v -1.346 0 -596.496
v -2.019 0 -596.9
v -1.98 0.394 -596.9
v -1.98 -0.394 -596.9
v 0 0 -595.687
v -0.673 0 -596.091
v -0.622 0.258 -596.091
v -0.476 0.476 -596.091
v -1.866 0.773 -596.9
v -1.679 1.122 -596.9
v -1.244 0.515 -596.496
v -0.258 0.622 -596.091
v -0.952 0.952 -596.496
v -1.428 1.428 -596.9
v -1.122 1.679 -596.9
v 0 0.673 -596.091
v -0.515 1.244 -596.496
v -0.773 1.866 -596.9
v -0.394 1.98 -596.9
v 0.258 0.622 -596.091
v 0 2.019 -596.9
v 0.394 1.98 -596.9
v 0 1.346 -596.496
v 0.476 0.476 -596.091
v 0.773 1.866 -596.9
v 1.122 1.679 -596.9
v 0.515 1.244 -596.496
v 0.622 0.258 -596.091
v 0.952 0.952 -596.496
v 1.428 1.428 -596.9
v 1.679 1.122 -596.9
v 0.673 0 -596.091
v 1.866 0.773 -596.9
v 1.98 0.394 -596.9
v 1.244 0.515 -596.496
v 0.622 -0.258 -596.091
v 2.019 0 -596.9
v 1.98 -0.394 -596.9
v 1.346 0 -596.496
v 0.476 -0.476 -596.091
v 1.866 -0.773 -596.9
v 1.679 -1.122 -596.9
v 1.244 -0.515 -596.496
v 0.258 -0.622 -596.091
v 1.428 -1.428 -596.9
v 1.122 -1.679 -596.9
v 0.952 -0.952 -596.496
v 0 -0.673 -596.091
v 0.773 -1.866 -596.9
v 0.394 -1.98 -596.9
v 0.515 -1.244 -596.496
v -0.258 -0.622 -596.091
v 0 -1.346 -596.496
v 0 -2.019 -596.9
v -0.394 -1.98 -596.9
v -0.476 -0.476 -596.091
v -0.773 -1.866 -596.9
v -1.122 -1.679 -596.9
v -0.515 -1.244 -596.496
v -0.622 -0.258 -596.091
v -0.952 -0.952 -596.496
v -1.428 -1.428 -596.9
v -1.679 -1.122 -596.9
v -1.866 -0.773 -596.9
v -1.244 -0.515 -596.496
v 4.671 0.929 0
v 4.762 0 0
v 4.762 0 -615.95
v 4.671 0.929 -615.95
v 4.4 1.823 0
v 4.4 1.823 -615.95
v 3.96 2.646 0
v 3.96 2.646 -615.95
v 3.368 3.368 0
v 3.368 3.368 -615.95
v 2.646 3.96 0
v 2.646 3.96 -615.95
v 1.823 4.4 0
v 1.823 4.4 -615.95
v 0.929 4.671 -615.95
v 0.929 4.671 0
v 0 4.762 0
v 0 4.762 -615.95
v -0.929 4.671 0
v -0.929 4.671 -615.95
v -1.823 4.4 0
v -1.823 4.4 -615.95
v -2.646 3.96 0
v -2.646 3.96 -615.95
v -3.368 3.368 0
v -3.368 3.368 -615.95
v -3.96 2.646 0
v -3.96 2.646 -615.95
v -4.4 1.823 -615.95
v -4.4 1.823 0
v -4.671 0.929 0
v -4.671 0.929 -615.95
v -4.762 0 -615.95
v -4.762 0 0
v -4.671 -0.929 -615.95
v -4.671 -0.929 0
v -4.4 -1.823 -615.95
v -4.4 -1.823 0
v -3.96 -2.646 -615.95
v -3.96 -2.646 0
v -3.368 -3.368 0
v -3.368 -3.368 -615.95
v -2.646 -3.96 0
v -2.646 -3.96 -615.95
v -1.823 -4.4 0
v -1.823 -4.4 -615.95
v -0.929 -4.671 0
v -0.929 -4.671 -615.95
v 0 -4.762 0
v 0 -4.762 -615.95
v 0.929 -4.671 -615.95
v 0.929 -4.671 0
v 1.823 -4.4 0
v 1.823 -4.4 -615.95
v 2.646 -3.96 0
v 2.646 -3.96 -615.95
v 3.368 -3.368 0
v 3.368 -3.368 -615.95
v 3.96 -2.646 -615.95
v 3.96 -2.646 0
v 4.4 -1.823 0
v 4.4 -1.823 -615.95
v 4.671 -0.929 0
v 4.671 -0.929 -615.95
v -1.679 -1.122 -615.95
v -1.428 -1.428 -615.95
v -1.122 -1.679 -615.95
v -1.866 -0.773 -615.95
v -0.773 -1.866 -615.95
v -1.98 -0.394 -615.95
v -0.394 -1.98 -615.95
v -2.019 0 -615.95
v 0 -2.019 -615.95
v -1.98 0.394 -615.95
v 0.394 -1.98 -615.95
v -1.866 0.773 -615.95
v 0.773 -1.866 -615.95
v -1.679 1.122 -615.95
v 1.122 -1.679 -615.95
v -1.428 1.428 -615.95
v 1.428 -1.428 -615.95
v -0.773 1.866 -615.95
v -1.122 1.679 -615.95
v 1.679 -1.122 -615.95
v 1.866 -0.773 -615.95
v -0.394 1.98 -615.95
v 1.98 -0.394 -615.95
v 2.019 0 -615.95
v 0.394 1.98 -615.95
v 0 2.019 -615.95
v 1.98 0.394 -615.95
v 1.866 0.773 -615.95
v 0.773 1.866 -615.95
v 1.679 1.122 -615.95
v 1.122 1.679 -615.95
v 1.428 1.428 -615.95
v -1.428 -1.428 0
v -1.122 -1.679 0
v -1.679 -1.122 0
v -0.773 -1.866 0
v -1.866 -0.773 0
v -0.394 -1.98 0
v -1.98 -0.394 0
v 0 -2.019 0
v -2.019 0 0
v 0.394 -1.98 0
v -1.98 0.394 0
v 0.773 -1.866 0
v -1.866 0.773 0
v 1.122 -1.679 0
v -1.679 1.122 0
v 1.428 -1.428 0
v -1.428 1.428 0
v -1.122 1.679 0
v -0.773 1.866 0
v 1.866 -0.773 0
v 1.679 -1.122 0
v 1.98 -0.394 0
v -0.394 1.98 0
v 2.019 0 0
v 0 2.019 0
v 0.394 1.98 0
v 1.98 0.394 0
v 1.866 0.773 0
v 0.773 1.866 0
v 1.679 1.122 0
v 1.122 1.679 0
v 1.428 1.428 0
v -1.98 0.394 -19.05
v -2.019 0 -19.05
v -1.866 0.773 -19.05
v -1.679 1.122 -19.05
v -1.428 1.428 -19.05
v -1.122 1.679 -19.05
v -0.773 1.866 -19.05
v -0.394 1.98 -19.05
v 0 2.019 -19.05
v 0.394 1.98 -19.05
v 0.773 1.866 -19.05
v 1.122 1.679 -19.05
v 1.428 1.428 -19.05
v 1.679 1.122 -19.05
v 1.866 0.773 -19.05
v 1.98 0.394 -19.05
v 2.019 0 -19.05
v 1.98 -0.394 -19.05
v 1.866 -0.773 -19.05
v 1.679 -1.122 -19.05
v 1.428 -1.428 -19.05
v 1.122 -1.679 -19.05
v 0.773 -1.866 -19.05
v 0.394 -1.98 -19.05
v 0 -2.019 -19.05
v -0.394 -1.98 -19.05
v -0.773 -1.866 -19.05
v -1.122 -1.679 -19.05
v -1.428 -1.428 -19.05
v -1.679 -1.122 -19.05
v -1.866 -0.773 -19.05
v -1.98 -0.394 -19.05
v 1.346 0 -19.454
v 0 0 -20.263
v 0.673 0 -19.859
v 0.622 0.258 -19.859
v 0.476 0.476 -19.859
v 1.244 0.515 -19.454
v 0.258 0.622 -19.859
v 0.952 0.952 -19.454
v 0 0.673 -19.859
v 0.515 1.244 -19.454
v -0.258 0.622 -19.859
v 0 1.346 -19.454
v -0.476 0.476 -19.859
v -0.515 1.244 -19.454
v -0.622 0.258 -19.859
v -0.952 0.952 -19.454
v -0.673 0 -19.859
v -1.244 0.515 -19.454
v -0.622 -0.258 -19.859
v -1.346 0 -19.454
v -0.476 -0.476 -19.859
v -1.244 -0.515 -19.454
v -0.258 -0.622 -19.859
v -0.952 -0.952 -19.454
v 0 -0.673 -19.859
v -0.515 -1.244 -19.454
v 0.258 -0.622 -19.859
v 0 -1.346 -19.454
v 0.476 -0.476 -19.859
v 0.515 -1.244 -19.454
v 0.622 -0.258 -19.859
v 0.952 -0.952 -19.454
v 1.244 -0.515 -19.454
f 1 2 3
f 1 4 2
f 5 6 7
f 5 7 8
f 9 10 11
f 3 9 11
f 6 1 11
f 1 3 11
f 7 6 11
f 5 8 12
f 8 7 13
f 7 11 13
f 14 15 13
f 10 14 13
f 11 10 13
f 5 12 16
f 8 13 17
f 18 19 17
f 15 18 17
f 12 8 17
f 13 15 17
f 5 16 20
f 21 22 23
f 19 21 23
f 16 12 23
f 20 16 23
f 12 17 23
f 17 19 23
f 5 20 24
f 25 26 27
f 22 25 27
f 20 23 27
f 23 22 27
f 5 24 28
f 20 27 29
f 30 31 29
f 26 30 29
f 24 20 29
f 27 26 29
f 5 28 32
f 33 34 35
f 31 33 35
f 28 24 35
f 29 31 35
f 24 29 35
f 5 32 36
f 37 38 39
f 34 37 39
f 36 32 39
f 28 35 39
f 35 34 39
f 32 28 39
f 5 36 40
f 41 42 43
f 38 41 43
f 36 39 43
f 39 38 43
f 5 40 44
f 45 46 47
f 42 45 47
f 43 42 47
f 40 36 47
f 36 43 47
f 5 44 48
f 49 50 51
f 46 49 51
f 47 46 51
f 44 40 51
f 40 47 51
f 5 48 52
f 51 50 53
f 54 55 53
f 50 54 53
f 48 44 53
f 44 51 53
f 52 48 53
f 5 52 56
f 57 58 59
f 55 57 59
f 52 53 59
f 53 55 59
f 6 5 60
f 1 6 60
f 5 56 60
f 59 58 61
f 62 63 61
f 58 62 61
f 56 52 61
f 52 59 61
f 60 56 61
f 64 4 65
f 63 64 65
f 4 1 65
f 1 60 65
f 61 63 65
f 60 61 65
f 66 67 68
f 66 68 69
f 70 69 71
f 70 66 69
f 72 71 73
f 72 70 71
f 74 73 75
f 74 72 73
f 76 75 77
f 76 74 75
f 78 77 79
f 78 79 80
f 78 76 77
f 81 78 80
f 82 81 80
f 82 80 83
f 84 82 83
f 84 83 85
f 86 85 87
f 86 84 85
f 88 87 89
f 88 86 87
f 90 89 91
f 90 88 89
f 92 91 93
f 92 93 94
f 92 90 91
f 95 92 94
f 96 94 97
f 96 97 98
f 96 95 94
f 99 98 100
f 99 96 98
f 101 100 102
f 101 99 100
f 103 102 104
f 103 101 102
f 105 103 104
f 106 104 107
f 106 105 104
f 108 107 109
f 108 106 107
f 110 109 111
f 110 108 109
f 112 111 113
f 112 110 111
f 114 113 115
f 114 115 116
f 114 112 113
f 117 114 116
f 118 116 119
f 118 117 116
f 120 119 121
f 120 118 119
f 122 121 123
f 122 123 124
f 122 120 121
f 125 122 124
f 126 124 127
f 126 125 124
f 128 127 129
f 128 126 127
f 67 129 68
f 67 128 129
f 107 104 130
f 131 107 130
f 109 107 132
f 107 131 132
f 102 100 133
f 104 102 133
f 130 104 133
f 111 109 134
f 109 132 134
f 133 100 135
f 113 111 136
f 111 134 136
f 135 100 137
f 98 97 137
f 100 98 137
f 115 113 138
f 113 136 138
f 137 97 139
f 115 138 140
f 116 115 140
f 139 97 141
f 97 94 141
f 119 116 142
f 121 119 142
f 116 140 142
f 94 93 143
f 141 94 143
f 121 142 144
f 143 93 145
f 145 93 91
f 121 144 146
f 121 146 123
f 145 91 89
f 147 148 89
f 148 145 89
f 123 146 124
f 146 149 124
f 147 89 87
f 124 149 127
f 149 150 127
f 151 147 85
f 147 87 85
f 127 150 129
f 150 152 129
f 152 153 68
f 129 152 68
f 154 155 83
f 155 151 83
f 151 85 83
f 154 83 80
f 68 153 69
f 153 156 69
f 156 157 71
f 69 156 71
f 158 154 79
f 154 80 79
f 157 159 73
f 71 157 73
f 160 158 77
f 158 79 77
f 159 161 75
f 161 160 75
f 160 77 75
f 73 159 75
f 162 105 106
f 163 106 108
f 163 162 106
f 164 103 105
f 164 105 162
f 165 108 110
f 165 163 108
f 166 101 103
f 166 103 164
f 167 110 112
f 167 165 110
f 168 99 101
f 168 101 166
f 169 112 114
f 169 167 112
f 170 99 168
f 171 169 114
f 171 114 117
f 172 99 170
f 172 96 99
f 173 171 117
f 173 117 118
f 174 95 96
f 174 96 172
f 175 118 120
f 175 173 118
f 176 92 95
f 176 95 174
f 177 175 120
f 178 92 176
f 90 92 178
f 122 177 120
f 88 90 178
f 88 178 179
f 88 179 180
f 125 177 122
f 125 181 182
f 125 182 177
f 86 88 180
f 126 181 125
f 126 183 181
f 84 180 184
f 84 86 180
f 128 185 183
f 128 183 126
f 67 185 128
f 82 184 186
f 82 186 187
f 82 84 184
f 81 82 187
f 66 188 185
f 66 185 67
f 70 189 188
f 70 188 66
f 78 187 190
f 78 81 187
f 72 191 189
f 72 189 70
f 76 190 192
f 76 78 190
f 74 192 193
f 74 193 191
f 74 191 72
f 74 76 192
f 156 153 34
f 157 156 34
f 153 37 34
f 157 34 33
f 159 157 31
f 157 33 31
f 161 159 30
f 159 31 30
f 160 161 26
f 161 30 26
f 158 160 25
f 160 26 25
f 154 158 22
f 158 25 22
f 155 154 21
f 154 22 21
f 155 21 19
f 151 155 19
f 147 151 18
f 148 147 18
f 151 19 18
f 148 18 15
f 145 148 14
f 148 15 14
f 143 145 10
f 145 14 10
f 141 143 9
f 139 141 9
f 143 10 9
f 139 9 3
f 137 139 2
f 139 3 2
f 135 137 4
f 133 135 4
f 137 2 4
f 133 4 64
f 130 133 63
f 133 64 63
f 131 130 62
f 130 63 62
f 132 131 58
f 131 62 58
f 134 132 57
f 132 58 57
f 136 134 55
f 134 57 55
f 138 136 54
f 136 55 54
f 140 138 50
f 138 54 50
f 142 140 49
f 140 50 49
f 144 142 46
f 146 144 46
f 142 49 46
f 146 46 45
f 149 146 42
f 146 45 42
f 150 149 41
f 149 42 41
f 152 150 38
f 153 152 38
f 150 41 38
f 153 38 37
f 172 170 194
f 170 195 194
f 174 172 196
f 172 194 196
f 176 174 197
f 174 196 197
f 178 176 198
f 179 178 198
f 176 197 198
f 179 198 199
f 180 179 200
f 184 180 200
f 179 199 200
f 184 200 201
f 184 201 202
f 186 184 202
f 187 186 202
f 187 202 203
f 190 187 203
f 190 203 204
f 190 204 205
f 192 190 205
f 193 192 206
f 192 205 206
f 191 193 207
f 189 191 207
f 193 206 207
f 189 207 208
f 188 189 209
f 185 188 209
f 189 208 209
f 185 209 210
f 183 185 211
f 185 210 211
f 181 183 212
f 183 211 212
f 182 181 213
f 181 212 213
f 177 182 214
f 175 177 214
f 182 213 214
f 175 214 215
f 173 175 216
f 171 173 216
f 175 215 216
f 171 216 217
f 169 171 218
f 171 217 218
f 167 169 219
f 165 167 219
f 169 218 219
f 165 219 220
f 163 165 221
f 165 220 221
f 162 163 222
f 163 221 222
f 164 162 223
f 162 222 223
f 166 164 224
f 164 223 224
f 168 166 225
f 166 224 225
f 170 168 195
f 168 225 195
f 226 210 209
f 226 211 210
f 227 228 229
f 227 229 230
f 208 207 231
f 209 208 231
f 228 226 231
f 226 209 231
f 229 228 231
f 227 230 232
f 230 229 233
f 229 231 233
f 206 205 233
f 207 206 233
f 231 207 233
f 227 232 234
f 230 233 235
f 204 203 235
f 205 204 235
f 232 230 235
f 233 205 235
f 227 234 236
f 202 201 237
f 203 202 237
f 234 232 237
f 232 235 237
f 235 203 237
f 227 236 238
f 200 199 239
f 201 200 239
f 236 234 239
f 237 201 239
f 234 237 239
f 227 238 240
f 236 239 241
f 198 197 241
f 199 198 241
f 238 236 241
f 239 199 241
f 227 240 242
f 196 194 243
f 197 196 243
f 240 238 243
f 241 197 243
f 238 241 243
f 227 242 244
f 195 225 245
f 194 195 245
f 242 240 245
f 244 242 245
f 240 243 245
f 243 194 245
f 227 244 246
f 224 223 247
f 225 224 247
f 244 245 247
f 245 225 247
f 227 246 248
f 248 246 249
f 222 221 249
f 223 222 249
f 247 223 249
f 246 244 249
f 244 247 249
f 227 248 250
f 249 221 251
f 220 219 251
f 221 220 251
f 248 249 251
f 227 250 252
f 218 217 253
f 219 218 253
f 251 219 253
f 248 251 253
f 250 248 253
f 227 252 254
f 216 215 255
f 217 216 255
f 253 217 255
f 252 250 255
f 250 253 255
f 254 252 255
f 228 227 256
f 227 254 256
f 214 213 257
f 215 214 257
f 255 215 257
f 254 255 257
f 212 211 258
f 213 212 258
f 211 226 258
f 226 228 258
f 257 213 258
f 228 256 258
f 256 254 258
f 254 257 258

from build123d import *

# Parameters (mm, degrees)
SKETCH1_R                  = 4.7625
BOSS_EXTRUDE1_DEPTH        = 615.95
F_10_32_TAPPED_HOLE1_D     = 4.0386
F_10_32_TAPPED_HOLE1_DEPTH = 19.05
F_10_32_TAPPED_HOLE1_TIP   = 1.213317848
F_10_32_TAPPED_HOLE4_D     = 4.0386
F_10_32_TAPPED_HOLE4_DEPTH = 19.05
F_10_32_TAPPED_HOLE4_TIP   = 1.213317848


with BuildPart() as part:
    # Sketch1 → Boss-Extrude1 (new body)
    with BuildSketch(Plane.XY):
        Circle(SKETCH1_R)
    extrude(amount=-BOSS_EXTRUDE1_DEPTH)

    # #10-32 Tapped Hole1
    with Locations(Plane(origin=(0, 0, -615.95), x_dir=(-1, 0, 0), z_dir=(0, 0, -1))):
        with Locations((0, 0)):
            Hole(F_10_32_TAPPED_HOLE1_D / 2, depth=F_10_32_TAPPED_HOLE1_DEPTH)
            with Locations((0, 0, -(F_10_32_TAPPED_HOLE1_DEPTH + F_10_32_TAPPED_HOLE1_TIP / 2))):  # 118° drill point
                Cone(0, F_10_32_TAPPED_HOLE1_D / 2, F_10_32_TAPPED_HOLE1_TIP, mode=Mode.SUBTRACT)

    # #10-32 Tapped Hole4
    with Locations(Plane.XY):
        with Locations((0, 0)):
            Hole(F_10_32_TAPPED_HOLE4_D / 2, depth=F_10_32_TAPPED_HOLE4_DEPTH)
            with Locations((0, 0, -(F_10_32_TAPPED_HOLE4_DEPTH + F_10_32_TAPPED_HOLE4_TIP / 2))):  # 118° drill point
                Cone(0, F_10_32_TAPPED_HOLE4_D / 2, F_10_32_TAPPED_HOLE4_TIP, mode=Mode.SUBTRACT)


solid = part.part
